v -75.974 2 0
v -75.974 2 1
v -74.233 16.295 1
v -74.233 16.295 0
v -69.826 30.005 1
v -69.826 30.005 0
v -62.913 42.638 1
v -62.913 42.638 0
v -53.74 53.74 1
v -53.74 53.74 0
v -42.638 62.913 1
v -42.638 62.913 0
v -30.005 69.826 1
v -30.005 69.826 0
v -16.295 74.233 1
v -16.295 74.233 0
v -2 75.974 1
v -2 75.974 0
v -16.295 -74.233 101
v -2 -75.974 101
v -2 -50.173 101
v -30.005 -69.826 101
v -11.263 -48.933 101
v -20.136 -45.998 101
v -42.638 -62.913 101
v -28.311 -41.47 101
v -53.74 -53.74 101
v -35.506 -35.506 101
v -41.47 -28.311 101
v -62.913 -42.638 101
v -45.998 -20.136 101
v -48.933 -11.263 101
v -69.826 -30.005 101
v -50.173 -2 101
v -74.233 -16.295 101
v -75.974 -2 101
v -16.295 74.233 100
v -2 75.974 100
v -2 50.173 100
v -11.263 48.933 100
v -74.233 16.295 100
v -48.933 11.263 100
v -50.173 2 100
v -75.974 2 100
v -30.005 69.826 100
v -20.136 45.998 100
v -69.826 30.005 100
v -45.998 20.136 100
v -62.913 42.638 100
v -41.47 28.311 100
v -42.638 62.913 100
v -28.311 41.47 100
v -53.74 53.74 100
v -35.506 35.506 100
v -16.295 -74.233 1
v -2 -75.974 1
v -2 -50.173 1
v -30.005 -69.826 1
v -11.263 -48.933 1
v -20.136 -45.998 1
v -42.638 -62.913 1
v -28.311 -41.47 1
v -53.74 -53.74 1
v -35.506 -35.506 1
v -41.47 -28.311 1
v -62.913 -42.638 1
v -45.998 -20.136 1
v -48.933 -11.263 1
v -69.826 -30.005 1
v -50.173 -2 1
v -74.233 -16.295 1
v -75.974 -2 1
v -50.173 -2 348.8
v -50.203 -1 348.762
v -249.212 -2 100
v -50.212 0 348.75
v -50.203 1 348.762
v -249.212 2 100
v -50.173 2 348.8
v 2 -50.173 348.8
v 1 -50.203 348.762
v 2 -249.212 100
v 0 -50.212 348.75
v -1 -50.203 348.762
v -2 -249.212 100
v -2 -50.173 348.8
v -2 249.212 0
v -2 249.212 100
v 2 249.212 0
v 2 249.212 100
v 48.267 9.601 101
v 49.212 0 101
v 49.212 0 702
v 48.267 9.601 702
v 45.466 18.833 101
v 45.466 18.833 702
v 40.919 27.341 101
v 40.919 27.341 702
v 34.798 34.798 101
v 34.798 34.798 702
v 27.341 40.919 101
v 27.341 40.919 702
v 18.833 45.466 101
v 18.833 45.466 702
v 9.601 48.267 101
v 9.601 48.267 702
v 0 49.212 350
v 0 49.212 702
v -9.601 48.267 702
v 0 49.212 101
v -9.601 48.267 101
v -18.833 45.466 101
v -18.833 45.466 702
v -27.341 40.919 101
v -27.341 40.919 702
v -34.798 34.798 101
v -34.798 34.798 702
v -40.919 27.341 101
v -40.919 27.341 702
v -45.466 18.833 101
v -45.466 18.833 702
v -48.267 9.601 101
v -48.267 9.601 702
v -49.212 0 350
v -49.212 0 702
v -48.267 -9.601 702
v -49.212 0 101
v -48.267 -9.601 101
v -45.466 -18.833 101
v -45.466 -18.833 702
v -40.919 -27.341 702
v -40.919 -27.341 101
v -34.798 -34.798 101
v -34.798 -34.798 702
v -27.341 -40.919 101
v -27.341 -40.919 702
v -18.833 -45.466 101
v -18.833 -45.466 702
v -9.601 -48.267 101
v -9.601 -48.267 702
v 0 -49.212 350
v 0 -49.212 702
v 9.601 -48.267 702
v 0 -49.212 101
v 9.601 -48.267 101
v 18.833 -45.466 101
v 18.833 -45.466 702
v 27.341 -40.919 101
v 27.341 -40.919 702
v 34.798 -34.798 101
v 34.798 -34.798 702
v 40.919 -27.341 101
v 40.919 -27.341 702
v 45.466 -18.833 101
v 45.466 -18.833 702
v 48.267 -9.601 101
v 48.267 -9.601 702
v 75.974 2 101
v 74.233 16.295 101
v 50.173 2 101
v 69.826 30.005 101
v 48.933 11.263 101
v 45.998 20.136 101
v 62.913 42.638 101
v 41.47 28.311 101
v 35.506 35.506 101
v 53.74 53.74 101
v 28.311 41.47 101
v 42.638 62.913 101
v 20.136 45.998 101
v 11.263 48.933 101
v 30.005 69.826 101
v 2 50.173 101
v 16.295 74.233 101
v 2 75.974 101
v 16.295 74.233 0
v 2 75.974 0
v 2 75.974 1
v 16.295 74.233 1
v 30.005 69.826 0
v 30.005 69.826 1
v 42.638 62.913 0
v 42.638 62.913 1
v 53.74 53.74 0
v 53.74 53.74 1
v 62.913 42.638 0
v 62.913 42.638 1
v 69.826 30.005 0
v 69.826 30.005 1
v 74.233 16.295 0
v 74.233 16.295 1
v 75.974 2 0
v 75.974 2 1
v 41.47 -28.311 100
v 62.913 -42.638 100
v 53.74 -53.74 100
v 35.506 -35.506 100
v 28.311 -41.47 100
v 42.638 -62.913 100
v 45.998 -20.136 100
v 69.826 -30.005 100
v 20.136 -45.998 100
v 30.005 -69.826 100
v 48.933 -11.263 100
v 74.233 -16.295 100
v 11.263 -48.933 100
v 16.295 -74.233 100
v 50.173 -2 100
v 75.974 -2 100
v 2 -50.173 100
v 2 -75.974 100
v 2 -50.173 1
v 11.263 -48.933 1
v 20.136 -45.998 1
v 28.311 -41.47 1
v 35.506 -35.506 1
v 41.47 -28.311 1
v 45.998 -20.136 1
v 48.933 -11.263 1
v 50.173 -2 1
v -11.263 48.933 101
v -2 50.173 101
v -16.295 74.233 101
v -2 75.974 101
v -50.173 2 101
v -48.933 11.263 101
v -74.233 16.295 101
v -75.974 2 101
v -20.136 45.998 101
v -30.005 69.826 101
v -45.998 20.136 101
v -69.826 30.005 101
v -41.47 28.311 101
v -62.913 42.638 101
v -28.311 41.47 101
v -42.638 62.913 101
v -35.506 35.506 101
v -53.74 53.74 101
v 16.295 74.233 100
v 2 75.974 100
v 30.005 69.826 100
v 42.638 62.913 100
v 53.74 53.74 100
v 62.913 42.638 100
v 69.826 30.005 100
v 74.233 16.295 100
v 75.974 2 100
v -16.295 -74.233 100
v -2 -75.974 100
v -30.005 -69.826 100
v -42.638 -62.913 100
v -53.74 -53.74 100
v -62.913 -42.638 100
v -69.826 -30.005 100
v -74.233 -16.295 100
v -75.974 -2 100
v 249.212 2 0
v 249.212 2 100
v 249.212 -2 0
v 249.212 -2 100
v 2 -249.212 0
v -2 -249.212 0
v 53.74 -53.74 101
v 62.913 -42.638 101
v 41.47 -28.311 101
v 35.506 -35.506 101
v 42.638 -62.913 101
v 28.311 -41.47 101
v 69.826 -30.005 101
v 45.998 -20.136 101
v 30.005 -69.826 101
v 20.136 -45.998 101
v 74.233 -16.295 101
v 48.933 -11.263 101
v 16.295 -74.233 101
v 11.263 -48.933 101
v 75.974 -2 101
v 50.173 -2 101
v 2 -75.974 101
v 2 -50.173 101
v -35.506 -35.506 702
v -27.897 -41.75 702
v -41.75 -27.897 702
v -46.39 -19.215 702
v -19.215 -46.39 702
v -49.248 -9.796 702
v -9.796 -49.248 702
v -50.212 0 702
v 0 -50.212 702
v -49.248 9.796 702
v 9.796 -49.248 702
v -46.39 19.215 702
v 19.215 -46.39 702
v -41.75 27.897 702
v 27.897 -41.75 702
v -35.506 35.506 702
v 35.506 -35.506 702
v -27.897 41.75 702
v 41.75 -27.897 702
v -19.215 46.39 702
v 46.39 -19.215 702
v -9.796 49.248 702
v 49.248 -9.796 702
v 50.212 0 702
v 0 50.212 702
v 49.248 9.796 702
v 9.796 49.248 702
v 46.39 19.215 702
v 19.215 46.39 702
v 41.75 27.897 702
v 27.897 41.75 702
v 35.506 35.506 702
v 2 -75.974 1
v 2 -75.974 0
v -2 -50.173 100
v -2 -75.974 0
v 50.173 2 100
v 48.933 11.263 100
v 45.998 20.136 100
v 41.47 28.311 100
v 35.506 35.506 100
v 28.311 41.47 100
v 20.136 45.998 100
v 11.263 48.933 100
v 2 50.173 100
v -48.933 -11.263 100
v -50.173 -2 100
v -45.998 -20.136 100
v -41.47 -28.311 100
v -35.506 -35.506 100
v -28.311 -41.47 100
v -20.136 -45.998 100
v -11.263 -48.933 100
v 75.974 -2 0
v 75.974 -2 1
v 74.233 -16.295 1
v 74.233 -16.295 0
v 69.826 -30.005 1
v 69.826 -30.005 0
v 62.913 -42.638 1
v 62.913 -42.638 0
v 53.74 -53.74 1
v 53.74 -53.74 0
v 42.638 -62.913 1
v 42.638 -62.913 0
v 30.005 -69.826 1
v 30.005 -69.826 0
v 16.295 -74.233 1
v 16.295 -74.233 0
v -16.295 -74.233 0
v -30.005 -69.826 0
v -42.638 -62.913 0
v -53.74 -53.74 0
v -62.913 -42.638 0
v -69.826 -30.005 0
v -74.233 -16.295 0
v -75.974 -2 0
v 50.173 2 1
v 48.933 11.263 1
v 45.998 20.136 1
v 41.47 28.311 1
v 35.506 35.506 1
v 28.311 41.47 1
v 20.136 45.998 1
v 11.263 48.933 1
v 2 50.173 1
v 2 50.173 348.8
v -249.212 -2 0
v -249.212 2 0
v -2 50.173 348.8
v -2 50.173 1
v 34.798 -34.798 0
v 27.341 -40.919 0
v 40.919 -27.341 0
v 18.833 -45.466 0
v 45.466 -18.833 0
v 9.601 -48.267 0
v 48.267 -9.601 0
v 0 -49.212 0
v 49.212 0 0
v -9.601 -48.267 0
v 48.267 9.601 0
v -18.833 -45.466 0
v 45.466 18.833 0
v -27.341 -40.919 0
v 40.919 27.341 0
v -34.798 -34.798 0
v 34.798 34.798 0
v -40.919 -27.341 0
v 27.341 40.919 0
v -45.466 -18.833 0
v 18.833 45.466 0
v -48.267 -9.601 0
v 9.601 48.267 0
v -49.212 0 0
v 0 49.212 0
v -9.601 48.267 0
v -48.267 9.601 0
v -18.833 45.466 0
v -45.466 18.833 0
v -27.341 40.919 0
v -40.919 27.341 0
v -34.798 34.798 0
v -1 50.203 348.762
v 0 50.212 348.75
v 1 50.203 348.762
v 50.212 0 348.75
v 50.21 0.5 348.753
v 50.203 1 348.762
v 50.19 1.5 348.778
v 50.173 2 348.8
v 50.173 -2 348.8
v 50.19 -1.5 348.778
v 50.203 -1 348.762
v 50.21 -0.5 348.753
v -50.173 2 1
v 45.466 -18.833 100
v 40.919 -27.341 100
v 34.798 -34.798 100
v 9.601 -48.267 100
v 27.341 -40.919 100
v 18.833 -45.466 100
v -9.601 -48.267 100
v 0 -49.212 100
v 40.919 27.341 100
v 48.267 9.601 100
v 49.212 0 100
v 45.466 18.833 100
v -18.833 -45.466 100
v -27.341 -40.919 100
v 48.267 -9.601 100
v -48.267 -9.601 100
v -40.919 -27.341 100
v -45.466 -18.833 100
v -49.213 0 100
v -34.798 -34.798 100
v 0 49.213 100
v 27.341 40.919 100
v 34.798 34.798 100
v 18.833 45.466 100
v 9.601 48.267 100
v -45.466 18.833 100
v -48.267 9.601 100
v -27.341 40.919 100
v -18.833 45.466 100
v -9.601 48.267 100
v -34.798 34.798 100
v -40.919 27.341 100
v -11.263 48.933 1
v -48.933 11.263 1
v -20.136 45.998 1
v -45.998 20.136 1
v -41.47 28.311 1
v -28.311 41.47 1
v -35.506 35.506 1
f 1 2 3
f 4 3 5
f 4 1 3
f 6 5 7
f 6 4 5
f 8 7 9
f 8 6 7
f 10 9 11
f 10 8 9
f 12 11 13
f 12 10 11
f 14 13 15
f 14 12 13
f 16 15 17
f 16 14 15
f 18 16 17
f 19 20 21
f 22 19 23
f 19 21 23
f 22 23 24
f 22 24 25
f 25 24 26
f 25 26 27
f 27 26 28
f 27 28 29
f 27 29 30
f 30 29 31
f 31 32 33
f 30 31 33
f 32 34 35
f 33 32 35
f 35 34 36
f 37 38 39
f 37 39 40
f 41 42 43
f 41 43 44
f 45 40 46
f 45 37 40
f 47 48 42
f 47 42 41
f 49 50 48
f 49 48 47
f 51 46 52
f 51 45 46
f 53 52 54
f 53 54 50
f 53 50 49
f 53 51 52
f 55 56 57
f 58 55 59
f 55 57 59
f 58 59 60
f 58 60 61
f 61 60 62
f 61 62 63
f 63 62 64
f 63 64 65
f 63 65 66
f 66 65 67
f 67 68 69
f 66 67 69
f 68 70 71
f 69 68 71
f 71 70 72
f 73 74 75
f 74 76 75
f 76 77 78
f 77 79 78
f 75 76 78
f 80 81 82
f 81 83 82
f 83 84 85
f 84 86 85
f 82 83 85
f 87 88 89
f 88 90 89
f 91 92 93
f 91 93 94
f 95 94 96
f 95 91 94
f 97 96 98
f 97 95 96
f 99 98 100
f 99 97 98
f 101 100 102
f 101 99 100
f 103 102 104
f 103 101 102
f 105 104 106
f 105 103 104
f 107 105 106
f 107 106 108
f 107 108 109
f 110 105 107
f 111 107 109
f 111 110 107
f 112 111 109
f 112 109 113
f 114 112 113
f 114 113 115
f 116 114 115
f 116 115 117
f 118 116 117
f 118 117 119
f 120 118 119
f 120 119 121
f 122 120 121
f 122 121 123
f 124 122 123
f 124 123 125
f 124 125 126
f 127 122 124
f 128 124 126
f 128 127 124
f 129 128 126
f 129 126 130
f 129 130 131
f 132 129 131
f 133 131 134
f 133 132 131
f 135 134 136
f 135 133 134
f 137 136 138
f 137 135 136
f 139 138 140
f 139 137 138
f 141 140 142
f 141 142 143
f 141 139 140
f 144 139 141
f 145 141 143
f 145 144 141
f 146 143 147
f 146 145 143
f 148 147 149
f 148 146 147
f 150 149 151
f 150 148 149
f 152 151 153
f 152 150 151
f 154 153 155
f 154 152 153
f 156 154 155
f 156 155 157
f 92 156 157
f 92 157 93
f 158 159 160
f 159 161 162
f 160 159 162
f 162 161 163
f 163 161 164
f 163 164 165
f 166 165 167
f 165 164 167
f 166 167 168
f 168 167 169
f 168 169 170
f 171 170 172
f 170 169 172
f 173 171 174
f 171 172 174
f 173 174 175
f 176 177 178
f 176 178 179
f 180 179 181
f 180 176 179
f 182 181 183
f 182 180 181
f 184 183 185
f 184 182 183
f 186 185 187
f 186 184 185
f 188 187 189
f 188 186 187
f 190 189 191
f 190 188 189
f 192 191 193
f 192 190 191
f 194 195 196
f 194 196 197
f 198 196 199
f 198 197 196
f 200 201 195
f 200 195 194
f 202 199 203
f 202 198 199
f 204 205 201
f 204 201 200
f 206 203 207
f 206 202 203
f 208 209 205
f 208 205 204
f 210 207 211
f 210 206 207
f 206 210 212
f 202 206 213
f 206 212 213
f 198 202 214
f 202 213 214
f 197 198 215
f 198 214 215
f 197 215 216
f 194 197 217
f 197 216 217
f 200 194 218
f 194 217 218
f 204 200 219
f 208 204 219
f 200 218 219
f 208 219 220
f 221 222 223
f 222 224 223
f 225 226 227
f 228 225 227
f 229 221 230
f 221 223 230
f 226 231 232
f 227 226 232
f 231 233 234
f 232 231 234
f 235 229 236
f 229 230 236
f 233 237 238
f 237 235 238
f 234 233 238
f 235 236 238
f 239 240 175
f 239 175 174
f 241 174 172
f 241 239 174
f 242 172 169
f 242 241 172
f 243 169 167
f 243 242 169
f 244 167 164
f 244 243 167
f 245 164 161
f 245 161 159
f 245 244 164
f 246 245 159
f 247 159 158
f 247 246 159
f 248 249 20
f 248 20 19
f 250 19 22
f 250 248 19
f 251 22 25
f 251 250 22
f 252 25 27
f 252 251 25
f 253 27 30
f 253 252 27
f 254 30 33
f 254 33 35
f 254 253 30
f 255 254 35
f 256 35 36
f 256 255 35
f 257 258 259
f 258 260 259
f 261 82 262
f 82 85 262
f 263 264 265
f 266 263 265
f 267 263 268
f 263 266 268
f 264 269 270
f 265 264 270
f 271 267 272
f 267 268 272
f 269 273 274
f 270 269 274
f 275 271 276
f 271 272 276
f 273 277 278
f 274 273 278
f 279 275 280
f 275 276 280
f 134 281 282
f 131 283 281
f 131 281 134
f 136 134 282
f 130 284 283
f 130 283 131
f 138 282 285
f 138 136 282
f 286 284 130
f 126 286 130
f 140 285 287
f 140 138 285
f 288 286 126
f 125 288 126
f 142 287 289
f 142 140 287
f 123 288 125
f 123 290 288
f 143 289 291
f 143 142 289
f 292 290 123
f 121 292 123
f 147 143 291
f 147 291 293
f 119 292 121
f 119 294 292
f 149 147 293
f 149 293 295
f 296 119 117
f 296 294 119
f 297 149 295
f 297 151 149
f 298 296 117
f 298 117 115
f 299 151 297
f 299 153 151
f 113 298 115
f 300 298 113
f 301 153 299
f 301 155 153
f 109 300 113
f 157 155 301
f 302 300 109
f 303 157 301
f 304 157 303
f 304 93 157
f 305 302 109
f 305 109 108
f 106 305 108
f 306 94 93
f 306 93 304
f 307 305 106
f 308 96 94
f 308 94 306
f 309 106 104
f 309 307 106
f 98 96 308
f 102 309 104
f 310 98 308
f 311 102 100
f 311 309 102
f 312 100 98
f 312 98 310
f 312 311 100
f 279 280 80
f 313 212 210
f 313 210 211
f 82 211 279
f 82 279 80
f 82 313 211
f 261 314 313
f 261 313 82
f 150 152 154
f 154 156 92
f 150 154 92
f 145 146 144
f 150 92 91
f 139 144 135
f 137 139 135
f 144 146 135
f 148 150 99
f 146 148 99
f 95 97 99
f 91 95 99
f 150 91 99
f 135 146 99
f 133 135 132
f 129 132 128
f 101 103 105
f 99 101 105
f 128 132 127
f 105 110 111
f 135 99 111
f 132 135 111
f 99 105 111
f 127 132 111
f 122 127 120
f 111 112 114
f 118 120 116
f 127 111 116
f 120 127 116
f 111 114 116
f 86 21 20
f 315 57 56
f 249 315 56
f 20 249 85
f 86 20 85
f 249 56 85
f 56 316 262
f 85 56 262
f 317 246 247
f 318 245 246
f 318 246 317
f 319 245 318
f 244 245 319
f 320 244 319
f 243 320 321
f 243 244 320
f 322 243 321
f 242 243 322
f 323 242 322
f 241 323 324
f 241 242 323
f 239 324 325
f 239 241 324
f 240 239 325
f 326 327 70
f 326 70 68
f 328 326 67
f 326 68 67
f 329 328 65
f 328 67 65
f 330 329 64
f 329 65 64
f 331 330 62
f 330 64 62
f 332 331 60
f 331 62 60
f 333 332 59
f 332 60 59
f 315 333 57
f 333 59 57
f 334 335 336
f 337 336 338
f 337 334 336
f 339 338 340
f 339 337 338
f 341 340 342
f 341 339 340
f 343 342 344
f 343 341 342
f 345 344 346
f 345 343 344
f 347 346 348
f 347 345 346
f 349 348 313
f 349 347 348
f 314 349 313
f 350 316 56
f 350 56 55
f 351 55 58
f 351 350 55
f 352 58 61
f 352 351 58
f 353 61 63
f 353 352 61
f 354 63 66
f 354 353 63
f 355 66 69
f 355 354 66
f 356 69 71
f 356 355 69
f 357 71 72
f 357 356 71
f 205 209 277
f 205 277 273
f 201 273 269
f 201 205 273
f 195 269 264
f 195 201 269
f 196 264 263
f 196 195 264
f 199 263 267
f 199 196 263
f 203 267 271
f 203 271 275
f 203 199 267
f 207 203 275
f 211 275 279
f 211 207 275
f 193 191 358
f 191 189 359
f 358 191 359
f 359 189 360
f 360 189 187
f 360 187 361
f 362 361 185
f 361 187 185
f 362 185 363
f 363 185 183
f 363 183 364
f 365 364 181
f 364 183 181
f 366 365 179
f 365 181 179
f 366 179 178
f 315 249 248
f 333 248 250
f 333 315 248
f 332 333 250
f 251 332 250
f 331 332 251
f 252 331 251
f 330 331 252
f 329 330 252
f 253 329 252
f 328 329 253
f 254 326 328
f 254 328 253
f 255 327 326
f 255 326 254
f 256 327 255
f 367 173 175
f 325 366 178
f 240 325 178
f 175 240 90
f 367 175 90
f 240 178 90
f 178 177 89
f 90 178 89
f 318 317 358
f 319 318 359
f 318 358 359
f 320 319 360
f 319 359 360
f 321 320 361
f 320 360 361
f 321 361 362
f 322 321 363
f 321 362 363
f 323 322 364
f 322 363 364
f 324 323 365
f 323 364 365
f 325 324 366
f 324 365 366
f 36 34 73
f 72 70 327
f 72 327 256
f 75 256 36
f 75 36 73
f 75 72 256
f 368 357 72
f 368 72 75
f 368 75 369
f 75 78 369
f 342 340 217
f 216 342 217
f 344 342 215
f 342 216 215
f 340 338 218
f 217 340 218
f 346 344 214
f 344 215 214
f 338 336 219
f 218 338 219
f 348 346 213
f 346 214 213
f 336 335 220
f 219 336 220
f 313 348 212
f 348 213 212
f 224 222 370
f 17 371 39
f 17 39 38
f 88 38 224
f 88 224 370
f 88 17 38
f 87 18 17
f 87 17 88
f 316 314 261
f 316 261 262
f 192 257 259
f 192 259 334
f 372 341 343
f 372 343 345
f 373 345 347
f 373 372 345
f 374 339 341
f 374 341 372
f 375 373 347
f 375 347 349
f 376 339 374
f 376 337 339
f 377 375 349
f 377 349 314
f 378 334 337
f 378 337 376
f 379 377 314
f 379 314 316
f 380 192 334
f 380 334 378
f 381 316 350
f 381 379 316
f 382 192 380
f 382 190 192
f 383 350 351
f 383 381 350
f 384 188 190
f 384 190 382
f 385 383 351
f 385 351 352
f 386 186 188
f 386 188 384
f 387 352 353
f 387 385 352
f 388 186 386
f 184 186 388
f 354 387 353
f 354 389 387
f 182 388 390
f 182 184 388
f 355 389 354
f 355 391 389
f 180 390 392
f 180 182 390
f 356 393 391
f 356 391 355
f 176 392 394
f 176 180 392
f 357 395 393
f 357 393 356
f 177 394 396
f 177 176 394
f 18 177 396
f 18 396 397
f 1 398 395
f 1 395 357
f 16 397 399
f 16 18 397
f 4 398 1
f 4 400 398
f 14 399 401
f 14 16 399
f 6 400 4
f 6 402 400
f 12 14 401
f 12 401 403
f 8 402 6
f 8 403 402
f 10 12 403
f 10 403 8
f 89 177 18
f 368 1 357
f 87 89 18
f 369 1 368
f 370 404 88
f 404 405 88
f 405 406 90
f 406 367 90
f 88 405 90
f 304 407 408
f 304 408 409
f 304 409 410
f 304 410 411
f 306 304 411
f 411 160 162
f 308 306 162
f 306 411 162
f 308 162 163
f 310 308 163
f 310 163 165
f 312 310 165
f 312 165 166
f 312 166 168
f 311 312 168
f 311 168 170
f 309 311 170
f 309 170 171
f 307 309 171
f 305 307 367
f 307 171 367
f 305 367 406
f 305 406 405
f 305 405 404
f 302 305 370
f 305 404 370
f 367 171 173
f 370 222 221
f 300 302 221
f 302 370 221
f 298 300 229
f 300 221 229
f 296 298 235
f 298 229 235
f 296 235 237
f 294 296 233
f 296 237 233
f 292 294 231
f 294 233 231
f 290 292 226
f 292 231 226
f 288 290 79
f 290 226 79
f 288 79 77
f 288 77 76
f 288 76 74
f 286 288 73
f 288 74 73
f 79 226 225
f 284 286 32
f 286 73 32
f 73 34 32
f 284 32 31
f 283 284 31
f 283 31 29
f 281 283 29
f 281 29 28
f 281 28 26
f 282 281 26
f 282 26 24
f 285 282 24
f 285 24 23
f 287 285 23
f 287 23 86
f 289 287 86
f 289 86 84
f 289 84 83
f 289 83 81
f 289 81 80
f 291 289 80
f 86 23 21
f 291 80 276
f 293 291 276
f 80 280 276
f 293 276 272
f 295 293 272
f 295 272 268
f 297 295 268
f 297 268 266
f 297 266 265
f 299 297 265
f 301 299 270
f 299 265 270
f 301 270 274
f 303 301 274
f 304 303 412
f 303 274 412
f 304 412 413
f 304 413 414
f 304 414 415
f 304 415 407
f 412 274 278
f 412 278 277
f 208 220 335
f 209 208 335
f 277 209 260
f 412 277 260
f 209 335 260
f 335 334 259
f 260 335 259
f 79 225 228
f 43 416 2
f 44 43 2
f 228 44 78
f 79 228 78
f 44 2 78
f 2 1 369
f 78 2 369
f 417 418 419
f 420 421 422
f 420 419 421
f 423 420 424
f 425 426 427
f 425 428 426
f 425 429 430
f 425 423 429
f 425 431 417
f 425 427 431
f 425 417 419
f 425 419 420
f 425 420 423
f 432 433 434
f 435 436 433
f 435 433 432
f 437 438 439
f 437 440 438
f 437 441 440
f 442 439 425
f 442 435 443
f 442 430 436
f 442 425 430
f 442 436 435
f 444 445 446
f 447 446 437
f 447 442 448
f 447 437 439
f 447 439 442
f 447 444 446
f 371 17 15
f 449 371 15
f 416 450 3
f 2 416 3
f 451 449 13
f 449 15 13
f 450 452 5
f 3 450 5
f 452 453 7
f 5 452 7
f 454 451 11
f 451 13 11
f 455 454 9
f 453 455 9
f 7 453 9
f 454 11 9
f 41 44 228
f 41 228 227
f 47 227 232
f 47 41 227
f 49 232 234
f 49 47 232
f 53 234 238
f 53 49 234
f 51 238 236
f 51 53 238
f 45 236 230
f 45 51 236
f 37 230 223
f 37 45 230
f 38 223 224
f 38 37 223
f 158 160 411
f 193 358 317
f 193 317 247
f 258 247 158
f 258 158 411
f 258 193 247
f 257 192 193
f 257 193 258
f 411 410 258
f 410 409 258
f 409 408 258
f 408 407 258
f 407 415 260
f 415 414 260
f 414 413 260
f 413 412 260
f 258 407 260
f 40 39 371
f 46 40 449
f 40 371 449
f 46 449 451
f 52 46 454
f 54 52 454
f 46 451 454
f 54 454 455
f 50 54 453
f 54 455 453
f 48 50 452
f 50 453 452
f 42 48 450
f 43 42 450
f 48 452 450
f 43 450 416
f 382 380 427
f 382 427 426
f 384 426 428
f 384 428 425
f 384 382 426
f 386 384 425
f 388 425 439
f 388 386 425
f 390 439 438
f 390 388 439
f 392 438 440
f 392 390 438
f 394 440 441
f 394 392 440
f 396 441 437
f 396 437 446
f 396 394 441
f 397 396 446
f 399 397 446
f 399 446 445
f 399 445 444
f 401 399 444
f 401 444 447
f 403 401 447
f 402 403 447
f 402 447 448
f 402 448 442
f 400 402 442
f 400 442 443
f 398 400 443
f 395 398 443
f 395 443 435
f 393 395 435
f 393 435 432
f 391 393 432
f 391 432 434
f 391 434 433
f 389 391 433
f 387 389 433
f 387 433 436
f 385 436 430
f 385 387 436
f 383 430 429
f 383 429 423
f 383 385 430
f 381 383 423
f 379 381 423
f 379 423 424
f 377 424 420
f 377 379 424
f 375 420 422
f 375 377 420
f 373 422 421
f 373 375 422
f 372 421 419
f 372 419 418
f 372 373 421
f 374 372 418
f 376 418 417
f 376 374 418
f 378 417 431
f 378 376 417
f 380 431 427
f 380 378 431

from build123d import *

# Parameters (mm, degrees)
SKETCH3_R           = 50.2125
SKETCH3_R_2         = 49.2125
BOSS_EXTRUDE1_DEPTH = 702
SKETCH4_R           = 76
SKETCH4_R_2         = 49.2125
BOSS_EXTRUDE2_DEPTH = 1
SKETCH5_R           = 76
BOSS_EXTRUDE3_DEPTH = 1
BOSS_EXTRUDE4_DEPTH = 2
CIRPATTERN1_COUNT   = 4


with BuildPart() as part:
    # Sketch3 → Boss-Extrude1 (new body)
    with BuildSketch(Plane.XY):
        Circle(SKETCH3_R)
        Circle(SKETCH3_R_2, mode=Mode.SUBTRACT)
    extrude(amount=BOSS_EXTRUDE1_DEPTH)

    # Sketch4 → Boss-Extrude2 (add)
    with BuildSketch(Plane(origin=(0, 0, 0), x_dir=(-1, 0, 0), z_dir=(0, 0, -1))):
        Circle(SKETCH4_R)
        Circle(SKETCH4_R_2, mode=Mode.SUBTRACT)
    extrude(amount=-BOSS_EXTRUDE2_DEPTH)

    # Sketch5 → Boss-Extrude3 (add)
    with BuildSketch(Plane(origin=(0, 0, 100), x_dir=(-1, 0, 0), z_dir=(0, 0, -1))):
        Circle(SKETCH5_R)
    extrude(amount=-BOSS_EXTRUDE3_DEPTH)

    # Sketch6 → Boss-Extrude4 (add, symmetric)
    with BuildSketch(Plane(origin=(0, 0, 0), x_dir=(1, 0, 0), z_dir=(0, 1, 0))):
        Polygon((-49.2125, 0), (-49.2125, -350), (-249.2125, -100), (-249.2125, 0), align=None)
    boss_extrude4 = extrude(amount=BOSS_EXTRUDE4_DEPTH, both=True)

    # CirPattern1: Boss-Extrude4 ×4 about axis
    cirpattern1_axis = Axis((0, 0, 702), (0, 0, -1))
    for i in range(1, CIRPATTERN1_COUNT):
        add(boss_extrude4.rotate(cirpattern1_axis, i * 360 / CIRPATTERN1_COUNT))


solid = part.part
